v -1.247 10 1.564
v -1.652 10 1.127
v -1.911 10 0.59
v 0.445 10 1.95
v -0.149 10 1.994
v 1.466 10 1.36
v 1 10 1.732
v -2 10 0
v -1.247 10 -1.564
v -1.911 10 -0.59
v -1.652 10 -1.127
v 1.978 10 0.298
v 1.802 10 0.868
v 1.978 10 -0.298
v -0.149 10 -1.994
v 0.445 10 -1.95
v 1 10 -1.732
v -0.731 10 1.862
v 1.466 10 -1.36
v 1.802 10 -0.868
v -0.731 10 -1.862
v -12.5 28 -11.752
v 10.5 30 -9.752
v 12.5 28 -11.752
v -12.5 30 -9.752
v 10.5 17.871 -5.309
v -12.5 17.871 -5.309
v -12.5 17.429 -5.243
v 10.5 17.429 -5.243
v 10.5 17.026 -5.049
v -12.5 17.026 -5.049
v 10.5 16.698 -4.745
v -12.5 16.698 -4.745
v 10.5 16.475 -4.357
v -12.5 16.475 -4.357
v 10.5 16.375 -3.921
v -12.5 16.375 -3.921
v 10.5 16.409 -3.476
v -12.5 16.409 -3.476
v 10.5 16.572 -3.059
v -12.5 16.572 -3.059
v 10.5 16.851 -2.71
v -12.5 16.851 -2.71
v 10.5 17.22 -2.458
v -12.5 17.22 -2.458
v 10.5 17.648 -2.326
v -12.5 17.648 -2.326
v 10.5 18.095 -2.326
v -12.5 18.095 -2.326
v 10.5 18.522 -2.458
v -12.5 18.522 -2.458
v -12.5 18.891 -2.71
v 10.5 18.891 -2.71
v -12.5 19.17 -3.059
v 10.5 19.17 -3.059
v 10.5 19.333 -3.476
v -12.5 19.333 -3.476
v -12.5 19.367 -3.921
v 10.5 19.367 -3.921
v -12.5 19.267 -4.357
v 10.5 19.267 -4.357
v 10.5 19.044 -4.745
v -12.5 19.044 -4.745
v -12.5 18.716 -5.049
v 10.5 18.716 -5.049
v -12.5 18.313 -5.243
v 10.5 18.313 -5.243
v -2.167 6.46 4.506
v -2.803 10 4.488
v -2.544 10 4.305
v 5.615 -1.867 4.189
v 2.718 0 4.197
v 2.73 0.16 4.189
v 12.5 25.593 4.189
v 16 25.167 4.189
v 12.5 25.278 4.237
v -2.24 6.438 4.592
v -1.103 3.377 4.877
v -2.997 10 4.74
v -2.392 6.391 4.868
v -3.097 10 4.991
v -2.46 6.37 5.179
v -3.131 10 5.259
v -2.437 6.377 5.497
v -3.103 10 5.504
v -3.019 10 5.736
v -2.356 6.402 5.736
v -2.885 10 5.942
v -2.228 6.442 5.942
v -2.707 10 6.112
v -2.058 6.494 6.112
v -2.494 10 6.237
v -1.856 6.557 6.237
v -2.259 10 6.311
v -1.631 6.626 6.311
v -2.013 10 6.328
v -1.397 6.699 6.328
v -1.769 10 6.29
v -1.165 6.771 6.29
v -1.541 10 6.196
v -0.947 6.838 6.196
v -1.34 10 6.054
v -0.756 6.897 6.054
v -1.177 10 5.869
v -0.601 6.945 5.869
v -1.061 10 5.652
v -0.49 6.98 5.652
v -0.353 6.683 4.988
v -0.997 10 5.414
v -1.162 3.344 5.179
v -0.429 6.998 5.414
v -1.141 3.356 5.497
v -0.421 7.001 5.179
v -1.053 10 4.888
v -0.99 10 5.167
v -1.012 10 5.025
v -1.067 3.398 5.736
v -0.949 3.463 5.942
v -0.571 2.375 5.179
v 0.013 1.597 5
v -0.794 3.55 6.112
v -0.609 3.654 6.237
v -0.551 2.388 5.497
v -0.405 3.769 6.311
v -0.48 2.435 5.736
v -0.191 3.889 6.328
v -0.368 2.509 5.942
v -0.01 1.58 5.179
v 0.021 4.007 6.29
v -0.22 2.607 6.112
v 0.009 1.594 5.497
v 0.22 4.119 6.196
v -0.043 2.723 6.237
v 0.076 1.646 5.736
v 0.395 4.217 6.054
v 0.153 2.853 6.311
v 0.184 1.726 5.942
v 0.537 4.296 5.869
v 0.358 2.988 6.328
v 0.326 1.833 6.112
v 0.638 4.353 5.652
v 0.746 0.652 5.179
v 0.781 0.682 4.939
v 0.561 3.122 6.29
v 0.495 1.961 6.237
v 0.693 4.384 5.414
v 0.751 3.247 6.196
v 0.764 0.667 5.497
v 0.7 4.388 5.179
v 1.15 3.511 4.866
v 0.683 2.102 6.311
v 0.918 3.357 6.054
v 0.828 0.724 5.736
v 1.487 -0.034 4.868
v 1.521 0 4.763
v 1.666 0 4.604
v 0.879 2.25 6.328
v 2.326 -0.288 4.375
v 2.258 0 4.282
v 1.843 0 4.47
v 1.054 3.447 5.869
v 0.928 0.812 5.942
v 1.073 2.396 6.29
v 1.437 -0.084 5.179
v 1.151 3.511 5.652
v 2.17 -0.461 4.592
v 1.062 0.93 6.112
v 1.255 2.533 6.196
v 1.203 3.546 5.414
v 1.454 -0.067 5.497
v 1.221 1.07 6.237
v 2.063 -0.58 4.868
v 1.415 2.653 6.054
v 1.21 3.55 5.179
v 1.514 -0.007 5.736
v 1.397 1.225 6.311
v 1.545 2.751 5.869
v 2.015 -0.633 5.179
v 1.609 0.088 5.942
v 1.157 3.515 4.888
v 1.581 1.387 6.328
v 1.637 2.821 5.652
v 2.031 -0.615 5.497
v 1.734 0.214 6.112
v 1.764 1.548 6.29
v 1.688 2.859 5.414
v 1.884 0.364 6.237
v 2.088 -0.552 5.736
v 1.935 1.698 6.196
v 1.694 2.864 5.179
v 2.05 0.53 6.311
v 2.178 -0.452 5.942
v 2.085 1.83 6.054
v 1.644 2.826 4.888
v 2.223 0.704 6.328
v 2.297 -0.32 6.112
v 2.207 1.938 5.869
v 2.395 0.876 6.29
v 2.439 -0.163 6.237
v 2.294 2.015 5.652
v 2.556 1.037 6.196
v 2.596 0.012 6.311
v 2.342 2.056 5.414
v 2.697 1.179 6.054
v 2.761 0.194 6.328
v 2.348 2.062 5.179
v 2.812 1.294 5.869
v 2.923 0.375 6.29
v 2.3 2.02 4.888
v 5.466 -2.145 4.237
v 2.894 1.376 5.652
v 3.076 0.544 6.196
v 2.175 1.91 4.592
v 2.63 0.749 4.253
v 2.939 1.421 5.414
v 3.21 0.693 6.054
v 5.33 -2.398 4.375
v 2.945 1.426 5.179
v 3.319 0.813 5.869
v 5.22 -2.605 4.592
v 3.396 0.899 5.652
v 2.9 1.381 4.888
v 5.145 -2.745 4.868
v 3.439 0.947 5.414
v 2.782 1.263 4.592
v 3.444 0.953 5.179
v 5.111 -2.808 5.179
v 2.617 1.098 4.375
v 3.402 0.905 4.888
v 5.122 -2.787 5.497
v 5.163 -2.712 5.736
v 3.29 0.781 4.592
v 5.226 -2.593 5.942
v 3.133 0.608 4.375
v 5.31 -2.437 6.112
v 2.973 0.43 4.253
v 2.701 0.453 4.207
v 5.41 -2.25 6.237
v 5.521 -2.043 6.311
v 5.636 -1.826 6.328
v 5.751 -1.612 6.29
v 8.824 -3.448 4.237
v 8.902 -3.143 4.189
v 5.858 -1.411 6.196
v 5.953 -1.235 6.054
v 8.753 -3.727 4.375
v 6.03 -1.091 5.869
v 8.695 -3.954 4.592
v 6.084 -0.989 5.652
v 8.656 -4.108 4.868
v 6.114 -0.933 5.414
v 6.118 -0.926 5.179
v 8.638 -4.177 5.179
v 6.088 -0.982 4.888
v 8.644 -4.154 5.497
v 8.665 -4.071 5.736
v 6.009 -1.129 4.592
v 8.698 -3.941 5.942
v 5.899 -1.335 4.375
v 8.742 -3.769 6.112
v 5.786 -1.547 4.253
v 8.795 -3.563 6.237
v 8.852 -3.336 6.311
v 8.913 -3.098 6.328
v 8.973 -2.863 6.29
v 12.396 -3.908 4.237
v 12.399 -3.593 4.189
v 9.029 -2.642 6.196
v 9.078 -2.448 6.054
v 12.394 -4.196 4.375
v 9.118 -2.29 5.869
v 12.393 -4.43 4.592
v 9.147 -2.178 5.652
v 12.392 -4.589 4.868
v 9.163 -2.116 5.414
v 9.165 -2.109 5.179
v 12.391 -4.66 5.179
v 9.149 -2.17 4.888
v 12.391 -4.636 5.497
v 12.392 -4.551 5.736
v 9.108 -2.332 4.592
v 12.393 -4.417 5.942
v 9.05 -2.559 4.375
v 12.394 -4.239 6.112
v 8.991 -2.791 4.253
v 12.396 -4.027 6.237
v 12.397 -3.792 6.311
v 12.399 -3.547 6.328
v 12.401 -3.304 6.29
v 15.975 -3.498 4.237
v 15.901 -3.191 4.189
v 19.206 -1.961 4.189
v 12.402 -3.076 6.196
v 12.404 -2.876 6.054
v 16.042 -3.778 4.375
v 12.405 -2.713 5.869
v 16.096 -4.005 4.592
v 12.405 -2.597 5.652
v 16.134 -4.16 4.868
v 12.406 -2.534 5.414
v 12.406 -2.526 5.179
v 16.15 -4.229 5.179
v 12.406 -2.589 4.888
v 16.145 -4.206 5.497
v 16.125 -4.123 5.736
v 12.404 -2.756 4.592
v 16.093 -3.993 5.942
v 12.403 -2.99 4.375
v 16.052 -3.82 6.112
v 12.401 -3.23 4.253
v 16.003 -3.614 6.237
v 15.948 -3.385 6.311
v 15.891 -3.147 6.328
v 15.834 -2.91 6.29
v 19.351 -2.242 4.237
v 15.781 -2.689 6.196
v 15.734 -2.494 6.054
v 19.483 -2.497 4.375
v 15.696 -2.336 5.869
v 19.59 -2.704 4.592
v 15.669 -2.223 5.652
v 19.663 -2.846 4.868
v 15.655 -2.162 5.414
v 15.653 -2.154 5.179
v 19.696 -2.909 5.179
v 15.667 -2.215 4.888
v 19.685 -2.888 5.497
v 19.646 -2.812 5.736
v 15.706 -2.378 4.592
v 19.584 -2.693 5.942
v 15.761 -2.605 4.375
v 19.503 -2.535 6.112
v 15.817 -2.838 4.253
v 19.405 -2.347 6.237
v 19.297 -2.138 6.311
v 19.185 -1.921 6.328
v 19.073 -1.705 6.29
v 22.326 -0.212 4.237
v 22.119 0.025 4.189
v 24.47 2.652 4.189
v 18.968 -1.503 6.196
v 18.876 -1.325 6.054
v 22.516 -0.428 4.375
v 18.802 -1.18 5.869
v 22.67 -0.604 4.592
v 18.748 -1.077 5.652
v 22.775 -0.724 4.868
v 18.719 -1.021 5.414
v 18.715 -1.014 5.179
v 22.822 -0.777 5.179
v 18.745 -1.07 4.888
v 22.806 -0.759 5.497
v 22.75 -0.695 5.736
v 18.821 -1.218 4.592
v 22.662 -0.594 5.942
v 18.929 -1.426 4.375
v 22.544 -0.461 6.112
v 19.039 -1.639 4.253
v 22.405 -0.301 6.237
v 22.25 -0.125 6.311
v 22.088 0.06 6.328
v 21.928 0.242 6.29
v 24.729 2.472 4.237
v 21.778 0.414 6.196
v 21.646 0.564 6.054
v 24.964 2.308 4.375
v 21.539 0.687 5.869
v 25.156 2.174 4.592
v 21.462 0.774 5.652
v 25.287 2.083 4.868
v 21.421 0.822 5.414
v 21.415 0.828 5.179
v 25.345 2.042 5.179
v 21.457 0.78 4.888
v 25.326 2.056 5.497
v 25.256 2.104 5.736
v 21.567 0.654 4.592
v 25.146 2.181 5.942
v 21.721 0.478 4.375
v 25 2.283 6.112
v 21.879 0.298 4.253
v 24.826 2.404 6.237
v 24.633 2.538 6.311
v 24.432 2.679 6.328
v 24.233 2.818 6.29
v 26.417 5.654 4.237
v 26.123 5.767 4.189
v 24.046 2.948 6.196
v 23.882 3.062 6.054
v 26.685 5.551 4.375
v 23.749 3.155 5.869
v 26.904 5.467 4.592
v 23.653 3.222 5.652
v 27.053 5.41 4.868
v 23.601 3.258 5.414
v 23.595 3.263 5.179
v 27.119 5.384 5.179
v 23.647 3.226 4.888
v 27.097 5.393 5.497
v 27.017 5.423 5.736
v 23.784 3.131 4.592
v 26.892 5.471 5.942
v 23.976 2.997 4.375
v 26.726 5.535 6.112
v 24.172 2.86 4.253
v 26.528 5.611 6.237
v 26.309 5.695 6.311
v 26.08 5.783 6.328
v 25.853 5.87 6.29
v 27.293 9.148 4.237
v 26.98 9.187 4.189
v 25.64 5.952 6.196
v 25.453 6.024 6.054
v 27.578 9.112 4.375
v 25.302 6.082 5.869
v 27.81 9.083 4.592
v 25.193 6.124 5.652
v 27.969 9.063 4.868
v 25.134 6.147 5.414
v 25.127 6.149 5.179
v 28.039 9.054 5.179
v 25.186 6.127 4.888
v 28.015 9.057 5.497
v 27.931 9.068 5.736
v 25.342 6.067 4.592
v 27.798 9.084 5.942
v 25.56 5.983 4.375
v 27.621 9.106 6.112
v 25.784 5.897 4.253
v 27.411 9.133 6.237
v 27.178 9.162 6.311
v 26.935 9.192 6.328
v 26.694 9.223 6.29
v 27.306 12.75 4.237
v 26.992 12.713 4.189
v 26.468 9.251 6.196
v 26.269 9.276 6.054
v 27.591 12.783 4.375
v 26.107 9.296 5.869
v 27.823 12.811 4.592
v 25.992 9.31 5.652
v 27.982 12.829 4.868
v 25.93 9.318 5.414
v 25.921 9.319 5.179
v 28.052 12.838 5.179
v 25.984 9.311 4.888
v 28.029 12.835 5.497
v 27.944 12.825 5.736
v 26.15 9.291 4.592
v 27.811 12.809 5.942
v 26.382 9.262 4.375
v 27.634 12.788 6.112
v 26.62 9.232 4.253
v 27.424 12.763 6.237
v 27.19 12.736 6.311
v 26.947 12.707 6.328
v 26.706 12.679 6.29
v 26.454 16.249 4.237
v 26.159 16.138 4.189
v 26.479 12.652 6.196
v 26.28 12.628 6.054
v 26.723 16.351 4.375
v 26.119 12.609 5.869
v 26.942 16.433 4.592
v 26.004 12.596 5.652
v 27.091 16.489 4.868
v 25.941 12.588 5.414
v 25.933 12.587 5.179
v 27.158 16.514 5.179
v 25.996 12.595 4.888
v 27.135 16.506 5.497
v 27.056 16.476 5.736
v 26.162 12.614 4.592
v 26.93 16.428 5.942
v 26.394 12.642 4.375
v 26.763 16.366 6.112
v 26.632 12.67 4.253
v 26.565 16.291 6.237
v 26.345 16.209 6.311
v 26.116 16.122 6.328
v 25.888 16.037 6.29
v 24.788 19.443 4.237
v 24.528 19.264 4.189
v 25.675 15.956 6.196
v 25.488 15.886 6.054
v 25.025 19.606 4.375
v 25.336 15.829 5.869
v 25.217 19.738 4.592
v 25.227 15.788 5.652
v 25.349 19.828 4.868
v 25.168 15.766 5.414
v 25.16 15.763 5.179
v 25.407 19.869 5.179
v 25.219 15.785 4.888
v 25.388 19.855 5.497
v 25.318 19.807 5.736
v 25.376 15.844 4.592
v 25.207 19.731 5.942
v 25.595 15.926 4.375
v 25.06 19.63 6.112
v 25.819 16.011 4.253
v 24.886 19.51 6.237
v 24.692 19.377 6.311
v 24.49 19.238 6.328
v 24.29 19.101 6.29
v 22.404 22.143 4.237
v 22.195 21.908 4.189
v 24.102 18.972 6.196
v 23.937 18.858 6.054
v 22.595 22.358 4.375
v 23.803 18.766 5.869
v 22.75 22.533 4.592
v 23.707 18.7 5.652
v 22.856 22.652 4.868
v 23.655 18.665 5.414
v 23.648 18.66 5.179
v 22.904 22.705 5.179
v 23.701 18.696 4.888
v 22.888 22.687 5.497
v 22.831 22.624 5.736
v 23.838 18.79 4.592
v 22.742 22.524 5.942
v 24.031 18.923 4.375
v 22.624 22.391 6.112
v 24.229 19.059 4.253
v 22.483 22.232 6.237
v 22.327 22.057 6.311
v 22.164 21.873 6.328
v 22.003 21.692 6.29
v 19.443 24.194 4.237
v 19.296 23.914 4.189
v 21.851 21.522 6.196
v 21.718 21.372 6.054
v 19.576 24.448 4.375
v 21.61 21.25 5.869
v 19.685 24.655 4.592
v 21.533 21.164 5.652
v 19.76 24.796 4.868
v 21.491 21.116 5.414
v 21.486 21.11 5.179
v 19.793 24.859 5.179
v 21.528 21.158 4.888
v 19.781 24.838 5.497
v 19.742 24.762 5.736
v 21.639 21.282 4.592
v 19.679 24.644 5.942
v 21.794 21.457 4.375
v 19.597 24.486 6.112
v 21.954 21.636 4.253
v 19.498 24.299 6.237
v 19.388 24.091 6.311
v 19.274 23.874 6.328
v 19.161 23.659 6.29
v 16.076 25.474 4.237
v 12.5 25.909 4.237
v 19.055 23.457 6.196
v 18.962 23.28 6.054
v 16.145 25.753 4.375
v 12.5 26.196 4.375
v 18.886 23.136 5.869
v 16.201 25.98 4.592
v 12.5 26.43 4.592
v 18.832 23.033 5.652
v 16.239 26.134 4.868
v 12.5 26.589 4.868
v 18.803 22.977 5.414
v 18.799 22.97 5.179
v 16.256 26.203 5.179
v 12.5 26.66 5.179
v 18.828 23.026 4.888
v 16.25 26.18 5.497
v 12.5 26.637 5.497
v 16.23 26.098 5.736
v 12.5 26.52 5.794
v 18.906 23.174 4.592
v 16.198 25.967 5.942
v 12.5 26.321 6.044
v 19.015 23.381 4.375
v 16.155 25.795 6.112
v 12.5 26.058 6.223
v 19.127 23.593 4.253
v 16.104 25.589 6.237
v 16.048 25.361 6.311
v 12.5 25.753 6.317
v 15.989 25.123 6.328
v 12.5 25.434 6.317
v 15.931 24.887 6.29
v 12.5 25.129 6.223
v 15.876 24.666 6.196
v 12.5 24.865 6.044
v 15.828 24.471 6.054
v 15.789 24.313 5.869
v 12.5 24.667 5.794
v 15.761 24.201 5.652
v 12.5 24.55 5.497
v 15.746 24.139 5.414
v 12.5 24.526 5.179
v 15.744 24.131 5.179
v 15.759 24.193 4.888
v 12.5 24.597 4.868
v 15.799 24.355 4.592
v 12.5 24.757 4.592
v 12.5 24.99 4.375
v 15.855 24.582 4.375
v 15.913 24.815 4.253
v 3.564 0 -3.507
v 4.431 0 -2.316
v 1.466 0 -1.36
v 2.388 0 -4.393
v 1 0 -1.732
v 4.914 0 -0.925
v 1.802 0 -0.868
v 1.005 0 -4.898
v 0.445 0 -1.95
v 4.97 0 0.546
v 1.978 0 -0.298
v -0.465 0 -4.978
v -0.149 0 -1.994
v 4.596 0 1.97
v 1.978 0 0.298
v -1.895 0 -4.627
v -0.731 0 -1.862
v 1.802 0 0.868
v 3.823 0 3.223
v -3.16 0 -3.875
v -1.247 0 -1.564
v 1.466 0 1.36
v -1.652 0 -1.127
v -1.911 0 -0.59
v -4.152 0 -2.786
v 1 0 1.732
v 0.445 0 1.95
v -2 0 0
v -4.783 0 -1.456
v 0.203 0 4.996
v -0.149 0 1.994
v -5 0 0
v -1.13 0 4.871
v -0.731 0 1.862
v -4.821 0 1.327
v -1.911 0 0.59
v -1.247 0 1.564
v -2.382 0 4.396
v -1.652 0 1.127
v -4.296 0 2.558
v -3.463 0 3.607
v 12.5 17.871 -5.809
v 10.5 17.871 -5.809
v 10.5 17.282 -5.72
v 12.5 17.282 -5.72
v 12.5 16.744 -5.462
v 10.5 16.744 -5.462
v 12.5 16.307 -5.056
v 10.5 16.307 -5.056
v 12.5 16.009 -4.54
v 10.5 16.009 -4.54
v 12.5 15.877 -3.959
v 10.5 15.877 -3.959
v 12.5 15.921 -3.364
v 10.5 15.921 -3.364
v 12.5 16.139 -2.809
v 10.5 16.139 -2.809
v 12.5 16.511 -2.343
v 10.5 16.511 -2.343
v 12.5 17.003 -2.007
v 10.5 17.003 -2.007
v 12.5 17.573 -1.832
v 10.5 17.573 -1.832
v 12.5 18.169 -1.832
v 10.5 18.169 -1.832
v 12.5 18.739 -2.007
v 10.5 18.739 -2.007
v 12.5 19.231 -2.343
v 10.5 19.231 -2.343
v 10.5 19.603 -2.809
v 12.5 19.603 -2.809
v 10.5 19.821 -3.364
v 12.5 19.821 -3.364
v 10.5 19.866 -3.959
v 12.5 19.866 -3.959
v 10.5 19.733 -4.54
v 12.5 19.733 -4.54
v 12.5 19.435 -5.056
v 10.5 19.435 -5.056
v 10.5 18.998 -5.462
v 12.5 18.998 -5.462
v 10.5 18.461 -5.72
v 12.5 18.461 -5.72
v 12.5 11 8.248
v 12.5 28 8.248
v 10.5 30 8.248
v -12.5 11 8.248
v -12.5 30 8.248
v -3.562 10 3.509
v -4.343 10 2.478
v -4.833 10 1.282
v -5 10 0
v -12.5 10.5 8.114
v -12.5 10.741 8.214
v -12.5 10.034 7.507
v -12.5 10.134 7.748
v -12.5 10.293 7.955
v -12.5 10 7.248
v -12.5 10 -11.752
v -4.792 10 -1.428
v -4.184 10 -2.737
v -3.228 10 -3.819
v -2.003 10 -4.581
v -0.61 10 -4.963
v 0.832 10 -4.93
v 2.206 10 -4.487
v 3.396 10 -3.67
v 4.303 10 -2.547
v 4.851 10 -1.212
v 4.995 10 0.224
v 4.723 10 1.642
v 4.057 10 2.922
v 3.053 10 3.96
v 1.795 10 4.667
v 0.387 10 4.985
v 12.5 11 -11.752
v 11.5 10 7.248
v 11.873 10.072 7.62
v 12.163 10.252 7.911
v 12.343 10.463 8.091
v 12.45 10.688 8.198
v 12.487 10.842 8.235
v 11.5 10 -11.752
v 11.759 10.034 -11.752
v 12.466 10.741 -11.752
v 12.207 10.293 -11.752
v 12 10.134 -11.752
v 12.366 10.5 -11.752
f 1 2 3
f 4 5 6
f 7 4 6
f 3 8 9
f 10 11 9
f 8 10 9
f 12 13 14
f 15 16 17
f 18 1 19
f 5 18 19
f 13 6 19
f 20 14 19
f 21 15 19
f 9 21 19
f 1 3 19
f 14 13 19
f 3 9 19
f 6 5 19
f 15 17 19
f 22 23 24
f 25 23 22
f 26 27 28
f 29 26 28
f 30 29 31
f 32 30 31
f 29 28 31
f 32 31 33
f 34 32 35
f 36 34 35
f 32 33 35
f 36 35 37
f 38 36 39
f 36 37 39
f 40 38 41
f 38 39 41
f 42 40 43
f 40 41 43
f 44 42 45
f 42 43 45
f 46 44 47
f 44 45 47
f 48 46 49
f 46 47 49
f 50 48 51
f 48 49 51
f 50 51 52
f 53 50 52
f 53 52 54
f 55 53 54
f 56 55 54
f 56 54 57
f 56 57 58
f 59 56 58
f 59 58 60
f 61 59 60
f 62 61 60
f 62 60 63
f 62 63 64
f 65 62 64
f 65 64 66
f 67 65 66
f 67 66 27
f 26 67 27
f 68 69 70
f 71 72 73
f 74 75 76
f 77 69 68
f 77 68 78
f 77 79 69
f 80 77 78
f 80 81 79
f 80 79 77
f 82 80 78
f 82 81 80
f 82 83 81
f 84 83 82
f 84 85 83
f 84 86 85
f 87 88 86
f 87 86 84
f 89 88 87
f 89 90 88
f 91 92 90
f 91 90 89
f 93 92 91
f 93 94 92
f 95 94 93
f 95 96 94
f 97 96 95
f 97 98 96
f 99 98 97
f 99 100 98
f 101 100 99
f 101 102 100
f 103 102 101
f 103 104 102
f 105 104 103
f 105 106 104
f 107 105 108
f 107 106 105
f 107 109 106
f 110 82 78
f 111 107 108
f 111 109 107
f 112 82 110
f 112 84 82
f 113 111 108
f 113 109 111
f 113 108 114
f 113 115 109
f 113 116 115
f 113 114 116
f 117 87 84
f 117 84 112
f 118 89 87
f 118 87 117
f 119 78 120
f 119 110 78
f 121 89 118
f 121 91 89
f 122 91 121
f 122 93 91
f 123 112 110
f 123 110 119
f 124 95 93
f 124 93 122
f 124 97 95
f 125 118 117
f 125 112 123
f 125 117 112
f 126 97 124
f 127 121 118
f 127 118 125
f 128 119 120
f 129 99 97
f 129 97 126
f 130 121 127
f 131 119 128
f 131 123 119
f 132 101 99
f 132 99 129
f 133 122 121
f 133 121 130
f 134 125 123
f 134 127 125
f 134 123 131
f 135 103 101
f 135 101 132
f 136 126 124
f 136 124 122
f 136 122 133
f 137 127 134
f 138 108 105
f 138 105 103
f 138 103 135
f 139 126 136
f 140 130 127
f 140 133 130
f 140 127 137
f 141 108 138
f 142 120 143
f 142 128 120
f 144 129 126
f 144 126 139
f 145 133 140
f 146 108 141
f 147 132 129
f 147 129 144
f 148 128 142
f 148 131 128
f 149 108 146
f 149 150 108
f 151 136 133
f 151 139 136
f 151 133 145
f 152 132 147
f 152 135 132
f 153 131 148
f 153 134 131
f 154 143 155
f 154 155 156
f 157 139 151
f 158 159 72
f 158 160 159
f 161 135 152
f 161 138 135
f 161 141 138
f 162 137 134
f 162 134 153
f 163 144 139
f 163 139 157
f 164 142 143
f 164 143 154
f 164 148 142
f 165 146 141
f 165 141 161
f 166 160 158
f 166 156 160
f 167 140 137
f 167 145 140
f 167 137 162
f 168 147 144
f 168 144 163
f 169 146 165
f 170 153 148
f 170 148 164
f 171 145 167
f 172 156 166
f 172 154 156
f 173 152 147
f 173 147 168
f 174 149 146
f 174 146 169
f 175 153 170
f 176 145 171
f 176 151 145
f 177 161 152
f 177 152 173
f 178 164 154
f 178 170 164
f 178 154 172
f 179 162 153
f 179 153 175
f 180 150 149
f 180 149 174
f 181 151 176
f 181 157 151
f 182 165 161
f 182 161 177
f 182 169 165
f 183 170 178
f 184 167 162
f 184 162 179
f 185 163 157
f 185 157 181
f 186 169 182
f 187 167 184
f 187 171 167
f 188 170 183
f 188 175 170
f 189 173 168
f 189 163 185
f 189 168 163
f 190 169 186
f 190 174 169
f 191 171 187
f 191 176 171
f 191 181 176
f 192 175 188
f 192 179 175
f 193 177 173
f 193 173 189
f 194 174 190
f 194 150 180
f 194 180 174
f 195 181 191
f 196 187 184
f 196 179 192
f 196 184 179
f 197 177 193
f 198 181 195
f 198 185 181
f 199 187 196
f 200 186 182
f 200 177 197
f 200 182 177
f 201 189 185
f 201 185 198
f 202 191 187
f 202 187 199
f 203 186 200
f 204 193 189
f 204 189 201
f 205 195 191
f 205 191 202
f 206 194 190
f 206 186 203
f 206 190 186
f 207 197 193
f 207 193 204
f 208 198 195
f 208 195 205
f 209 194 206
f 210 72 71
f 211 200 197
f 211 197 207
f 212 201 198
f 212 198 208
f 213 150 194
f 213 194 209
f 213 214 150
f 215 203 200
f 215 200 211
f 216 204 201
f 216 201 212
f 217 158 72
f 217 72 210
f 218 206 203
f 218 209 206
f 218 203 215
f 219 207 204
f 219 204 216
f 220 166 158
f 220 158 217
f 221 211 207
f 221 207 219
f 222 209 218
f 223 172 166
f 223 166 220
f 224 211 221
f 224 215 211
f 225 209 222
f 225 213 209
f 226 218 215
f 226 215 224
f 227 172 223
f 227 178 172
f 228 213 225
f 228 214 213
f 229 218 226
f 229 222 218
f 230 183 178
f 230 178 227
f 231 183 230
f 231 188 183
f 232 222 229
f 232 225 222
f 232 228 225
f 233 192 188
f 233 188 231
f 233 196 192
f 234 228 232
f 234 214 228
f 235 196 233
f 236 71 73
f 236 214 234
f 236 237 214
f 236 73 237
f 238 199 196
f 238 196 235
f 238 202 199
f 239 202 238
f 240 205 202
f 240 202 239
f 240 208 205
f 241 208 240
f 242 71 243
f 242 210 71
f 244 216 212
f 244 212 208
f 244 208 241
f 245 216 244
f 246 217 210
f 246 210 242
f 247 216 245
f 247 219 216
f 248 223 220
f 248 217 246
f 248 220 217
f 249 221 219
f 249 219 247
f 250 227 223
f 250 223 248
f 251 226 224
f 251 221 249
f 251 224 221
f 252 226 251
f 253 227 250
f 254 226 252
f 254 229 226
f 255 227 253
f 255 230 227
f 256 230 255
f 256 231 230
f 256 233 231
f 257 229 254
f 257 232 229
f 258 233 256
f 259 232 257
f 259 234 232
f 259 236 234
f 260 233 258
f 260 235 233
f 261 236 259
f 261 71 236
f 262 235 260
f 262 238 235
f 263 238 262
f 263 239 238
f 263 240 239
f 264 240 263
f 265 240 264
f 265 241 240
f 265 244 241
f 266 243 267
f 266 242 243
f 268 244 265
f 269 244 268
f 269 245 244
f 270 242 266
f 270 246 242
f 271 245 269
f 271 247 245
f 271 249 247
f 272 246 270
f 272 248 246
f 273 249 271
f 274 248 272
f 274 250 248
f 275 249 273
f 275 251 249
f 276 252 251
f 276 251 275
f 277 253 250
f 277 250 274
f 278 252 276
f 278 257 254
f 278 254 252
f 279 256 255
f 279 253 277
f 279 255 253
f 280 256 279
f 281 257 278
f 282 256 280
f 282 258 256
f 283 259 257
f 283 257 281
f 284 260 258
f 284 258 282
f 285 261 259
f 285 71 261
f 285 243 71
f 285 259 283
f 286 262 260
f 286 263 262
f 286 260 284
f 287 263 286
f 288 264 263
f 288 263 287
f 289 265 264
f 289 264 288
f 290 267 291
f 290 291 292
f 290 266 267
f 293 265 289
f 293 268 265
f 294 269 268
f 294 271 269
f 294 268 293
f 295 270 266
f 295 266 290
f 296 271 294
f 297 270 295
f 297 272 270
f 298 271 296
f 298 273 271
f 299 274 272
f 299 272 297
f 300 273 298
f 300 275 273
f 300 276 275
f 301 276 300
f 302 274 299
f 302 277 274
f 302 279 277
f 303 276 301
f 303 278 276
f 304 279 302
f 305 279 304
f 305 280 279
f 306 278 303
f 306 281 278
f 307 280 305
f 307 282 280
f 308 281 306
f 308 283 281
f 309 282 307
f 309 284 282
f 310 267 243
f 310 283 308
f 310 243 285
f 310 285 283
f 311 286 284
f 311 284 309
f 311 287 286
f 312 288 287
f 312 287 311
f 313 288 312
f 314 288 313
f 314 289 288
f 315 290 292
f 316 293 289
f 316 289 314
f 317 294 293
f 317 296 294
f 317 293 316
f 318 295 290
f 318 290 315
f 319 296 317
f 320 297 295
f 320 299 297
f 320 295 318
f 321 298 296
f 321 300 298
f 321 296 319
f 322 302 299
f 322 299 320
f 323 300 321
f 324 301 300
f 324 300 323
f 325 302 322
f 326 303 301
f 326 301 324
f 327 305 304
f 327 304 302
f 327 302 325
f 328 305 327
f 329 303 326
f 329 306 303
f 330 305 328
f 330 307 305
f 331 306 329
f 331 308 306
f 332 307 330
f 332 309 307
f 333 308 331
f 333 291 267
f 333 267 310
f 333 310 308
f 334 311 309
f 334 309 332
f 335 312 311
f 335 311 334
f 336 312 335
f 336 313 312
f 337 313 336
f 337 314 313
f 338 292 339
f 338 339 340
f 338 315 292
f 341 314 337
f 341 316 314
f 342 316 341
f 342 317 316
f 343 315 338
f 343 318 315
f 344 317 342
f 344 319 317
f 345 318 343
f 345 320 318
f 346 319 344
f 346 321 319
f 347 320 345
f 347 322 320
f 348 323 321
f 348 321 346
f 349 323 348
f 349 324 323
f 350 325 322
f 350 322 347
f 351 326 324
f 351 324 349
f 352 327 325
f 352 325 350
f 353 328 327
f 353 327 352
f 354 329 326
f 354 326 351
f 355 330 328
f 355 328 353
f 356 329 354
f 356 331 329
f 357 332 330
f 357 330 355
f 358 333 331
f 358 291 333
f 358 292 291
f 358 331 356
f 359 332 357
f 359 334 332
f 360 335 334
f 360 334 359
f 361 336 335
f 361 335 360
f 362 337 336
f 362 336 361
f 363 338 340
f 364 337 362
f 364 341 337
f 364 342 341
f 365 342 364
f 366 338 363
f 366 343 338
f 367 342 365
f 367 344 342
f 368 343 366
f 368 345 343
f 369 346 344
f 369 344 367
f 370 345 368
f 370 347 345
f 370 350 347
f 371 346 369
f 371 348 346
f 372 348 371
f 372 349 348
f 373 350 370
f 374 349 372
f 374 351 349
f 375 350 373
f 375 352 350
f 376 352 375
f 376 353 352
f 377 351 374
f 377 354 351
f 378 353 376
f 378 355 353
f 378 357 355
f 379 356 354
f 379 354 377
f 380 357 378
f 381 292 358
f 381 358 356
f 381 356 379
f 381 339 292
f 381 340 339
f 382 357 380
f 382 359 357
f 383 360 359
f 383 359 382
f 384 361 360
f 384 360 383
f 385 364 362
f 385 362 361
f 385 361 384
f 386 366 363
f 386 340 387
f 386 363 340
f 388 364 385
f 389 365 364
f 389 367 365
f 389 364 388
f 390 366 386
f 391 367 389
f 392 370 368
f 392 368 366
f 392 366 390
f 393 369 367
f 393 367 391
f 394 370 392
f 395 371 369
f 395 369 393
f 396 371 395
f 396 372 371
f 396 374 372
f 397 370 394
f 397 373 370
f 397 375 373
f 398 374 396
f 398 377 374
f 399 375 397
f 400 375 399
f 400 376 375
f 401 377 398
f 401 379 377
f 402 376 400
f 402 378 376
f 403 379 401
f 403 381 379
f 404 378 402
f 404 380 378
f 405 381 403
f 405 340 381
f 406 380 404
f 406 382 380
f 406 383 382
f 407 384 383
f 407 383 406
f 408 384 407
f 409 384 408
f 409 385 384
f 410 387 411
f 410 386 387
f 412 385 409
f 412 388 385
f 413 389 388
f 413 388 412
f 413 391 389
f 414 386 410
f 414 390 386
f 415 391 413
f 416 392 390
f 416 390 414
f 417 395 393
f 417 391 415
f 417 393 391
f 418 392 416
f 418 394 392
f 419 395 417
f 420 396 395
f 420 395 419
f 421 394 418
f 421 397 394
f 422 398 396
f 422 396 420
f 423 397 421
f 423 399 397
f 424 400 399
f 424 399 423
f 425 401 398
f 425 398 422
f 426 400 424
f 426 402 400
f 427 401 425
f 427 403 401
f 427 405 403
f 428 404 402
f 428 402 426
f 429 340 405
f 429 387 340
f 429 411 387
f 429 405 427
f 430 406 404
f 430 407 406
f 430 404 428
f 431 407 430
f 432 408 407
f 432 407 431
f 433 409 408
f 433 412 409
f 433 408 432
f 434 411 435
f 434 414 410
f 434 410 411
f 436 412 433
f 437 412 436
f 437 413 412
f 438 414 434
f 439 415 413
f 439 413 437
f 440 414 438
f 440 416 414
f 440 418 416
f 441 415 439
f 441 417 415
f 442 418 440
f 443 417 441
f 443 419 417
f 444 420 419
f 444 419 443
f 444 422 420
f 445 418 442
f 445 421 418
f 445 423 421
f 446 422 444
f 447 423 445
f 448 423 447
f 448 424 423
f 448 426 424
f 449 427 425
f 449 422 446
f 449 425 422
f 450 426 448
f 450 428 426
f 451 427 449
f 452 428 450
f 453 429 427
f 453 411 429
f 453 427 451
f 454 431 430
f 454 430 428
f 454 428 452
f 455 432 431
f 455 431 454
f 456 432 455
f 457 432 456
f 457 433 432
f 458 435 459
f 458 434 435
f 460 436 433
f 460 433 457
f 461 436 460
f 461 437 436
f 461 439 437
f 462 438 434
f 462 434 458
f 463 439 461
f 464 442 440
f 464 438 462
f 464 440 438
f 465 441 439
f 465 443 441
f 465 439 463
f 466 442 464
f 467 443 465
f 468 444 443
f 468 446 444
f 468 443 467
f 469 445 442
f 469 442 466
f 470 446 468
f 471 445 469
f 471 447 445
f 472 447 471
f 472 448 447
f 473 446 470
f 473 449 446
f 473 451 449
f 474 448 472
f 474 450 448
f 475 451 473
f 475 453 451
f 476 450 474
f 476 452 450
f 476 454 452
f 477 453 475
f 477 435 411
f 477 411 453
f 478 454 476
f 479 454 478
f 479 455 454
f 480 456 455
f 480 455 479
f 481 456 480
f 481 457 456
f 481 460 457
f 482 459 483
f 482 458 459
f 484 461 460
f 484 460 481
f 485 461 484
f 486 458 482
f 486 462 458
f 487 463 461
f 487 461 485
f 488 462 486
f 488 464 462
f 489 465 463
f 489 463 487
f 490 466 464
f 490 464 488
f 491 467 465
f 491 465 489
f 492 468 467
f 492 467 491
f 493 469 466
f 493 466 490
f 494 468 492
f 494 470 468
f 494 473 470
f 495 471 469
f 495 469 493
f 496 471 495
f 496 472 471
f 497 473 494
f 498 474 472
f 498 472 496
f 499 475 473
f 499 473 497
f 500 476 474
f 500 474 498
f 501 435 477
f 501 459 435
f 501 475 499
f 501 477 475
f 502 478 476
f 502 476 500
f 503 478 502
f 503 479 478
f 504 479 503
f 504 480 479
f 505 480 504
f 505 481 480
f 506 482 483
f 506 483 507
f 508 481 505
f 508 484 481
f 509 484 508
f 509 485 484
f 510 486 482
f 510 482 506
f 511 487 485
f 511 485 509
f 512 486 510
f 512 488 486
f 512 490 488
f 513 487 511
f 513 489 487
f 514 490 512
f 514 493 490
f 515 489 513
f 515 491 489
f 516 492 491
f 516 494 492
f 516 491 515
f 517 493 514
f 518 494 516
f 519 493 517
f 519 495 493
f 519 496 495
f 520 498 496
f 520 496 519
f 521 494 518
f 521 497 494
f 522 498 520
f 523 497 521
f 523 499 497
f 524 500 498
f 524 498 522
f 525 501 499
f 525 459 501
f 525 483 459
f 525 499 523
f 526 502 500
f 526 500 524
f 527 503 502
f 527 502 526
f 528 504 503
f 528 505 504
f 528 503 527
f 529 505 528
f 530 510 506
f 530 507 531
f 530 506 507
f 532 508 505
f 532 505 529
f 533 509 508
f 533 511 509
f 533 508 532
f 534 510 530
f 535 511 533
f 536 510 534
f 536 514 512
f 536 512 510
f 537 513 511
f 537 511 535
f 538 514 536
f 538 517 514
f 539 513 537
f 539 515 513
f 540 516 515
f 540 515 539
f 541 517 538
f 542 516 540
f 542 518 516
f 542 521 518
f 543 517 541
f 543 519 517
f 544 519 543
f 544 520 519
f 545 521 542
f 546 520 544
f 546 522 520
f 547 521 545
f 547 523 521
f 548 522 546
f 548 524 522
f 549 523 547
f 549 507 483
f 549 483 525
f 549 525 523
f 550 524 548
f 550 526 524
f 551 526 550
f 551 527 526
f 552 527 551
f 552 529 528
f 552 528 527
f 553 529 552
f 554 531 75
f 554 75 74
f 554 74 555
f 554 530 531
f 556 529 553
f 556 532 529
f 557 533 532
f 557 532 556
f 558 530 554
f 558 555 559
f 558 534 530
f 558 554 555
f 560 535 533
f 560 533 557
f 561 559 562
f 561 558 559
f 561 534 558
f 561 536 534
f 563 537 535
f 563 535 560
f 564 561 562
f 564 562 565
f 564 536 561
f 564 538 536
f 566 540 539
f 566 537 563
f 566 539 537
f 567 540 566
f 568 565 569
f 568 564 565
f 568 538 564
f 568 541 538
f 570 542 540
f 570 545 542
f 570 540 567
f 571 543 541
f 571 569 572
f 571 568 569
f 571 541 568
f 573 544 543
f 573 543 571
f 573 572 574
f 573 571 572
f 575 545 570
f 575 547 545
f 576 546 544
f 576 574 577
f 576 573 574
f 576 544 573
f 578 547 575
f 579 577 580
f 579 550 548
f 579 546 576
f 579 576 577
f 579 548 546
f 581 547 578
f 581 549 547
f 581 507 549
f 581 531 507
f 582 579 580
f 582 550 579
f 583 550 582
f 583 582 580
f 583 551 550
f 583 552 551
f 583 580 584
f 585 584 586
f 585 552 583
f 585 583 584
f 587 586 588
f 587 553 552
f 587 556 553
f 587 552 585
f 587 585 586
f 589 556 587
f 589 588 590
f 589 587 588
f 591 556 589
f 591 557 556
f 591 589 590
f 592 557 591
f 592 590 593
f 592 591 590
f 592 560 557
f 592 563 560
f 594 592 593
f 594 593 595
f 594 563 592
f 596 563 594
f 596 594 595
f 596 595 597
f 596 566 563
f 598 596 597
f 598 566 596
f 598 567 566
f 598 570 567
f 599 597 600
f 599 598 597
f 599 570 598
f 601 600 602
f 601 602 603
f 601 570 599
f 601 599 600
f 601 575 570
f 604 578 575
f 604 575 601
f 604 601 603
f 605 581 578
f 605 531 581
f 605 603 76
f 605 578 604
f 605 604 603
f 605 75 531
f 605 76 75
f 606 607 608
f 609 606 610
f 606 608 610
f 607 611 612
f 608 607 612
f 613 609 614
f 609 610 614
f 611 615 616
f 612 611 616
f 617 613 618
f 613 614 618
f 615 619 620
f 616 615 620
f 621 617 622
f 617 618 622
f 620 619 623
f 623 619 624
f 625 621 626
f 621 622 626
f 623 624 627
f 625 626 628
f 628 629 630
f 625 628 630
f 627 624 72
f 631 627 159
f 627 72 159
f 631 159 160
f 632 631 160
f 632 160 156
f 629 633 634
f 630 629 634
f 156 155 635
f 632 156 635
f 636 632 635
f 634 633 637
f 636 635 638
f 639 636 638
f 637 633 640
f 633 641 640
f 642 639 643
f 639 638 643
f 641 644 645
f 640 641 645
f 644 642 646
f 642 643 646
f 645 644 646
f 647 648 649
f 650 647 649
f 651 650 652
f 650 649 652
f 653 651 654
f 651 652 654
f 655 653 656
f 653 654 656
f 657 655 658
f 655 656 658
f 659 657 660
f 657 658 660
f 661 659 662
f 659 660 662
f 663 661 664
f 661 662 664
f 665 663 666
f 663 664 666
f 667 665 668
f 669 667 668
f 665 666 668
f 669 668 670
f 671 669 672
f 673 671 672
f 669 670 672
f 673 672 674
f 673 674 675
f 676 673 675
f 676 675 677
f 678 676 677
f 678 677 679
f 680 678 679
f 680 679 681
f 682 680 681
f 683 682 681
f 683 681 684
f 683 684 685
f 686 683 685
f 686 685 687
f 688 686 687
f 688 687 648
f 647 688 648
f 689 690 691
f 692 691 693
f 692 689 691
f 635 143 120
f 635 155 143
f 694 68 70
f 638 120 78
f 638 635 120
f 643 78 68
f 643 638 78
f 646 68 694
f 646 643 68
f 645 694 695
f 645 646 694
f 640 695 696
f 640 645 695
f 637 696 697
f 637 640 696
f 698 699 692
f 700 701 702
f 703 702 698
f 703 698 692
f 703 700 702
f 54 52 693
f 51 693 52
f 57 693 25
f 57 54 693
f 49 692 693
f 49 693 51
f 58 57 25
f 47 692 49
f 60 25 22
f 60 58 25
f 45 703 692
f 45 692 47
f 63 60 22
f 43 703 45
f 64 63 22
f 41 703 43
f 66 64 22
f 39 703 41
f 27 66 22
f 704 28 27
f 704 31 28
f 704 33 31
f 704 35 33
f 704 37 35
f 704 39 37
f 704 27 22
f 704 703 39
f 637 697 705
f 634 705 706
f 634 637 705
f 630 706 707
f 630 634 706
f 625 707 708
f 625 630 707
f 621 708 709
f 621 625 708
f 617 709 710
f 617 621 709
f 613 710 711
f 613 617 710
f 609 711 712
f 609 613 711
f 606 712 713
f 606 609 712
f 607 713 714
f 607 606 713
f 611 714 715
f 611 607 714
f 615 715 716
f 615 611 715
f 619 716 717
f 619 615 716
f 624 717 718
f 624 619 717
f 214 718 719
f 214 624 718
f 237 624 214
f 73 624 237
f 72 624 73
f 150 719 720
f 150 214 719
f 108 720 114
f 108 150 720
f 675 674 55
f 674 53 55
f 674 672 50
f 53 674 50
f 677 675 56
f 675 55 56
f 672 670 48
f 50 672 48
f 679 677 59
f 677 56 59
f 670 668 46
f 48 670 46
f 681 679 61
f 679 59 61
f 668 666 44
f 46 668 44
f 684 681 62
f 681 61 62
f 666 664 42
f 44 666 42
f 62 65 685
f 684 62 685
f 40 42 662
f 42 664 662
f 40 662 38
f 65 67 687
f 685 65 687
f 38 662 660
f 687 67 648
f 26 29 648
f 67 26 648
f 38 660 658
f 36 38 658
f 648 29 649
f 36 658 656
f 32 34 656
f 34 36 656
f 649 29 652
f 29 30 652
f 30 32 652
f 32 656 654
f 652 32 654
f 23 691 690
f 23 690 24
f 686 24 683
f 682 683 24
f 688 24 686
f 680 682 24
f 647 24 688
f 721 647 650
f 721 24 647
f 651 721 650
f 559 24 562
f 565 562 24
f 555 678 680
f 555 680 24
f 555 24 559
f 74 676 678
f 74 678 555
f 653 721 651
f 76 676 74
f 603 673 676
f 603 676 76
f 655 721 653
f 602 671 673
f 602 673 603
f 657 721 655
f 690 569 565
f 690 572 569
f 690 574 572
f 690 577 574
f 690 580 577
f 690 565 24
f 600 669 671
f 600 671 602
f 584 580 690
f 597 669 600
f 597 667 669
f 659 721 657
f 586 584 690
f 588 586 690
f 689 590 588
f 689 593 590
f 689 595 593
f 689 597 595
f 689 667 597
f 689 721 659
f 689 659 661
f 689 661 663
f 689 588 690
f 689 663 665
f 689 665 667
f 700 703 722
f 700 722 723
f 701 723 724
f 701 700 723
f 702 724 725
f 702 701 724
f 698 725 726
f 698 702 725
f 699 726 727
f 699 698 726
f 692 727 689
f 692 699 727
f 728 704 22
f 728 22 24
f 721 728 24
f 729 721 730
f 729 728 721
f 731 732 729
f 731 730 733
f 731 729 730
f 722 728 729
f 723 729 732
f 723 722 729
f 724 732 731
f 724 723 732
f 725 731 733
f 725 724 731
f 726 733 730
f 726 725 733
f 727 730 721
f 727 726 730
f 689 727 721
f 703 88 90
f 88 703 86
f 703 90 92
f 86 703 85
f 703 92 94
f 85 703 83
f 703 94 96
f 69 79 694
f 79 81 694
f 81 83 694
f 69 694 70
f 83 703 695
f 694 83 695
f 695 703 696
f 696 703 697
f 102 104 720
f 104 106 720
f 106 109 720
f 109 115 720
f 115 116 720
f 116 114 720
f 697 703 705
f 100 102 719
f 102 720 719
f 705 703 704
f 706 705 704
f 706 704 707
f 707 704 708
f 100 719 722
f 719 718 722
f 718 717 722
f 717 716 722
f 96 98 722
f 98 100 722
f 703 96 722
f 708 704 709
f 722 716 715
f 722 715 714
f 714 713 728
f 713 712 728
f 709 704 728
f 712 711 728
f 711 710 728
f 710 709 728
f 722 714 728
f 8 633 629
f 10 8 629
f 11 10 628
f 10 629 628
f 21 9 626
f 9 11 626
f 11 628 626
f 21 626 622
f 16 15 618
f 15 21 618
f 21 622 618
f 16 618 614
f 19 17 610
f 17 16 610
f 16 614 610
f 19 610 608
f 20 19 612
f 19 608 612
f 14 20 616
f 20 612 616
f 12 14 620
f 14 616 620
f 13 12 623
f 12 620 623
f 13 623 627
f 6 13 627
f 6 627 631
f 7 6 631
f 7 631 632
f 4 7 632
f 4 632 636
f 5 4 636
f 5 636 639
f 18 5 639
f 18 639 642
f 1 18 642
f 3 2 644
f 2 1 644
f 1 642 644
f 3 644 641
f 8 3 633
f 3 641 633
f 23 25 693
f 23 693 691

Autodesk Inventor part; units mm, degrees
ref_plane "YZ Plane" through (0, 0, 0) normal (1, 0, 0) x (0, 1, 0)
ref_plane "XZ Plane" through (0, 0, 0) normal (0, 1, 0) x (-1, 0, 0)
ref_plane "XY Plane" through (0, 0, 0) normal (0, 0, 1) x (1, 0, 0)
sketch "Szkic1" plane through (0, 0, 0) normal (0, 1, 0) x (-1, 0, 0)
  circle A0 centre (0, 0) radius 5
  circle A1 centre (0, 0) radius 2
  dimension "d0" = 10
  dimension "d1" = 3
extrude "Wyciągnięcie proste1" add sketch "Szkic1" along normal blind 10
sketch "Szkic2" plane through (0, 10, 0) normal (0, 1, 0) x (1, 0, 0)
  circle A0 centre (0, 0) radius 5 projected
  circle A1 centre (0, 0) radius 2 projected
  line L0 (-12.5, 11.7523) -> (12.5, 11.7523)
  line L1 (12.5, 11.7523) -> (12.5, -8.2477)
  line L2 (12.5, -8.2477) -> (-12.5, -8.2477)
  line L3 (-12.5, -8.2477) -> (-12.5, 11.7523)
  line L4 (0, 11.1673) -> (0, -8.4509) construction
  dimension "d4" = 20
  dimension "d5" = 25
extrude "Wyciągnięcie proste2" add sketch "Szkic2" along normal blind 20 contours A0 | A1 | L0 L1 L2 L3
fillet "Zaokrąglenie1" radius 1 2 edges at (0, 10, 8.2477) (12.5, 10, -1.7523)
chamfer "Faza1" distance 2 angle 45 2 edges at (12.5, 30, -1.7523) (0, 30, -11.7523)
sketch "Szkic3" plane through (12.5, 11, 8.2477) normal (1, 0, 0) x (0, 0, -1)
  line L0 (0, 17) -> (20, 17) projected
  line L1 (0, 0) -> (0, 17) projected
  line L2 (20, 0) -> (0, 0) projected
  line L3 (20, 0) -> (20, 17) projected
  circle A0 centre (2.9885, 14.5933) radius 1.0701
  line L4 (9.4628, 11.1568) -> (9.4628, 6.3913)
  line L5 (7.1085, 8.774) -> (15.0257, 8.774)
  point P0 (8.2477, -11)
revolve "Obrót1" add sketch "Szkic3" angle 360 about axis through (12.5, 11, -11.7523) along (0, 0, 1) contours A0
sketch "Szkic4" plane through (12.5, 11, 8.2477) normal (1, 0, 0) x (0, 0, -1)
  point P0 (8.2477, -11)
  point P1 (12.057, 6.8711)
hole "Otwór1" at (12.5, 17.8711, -3.8093) direction (-1, 0, 0) diameter 3 end through all counterbore diameter 4 counterbore depth 2
